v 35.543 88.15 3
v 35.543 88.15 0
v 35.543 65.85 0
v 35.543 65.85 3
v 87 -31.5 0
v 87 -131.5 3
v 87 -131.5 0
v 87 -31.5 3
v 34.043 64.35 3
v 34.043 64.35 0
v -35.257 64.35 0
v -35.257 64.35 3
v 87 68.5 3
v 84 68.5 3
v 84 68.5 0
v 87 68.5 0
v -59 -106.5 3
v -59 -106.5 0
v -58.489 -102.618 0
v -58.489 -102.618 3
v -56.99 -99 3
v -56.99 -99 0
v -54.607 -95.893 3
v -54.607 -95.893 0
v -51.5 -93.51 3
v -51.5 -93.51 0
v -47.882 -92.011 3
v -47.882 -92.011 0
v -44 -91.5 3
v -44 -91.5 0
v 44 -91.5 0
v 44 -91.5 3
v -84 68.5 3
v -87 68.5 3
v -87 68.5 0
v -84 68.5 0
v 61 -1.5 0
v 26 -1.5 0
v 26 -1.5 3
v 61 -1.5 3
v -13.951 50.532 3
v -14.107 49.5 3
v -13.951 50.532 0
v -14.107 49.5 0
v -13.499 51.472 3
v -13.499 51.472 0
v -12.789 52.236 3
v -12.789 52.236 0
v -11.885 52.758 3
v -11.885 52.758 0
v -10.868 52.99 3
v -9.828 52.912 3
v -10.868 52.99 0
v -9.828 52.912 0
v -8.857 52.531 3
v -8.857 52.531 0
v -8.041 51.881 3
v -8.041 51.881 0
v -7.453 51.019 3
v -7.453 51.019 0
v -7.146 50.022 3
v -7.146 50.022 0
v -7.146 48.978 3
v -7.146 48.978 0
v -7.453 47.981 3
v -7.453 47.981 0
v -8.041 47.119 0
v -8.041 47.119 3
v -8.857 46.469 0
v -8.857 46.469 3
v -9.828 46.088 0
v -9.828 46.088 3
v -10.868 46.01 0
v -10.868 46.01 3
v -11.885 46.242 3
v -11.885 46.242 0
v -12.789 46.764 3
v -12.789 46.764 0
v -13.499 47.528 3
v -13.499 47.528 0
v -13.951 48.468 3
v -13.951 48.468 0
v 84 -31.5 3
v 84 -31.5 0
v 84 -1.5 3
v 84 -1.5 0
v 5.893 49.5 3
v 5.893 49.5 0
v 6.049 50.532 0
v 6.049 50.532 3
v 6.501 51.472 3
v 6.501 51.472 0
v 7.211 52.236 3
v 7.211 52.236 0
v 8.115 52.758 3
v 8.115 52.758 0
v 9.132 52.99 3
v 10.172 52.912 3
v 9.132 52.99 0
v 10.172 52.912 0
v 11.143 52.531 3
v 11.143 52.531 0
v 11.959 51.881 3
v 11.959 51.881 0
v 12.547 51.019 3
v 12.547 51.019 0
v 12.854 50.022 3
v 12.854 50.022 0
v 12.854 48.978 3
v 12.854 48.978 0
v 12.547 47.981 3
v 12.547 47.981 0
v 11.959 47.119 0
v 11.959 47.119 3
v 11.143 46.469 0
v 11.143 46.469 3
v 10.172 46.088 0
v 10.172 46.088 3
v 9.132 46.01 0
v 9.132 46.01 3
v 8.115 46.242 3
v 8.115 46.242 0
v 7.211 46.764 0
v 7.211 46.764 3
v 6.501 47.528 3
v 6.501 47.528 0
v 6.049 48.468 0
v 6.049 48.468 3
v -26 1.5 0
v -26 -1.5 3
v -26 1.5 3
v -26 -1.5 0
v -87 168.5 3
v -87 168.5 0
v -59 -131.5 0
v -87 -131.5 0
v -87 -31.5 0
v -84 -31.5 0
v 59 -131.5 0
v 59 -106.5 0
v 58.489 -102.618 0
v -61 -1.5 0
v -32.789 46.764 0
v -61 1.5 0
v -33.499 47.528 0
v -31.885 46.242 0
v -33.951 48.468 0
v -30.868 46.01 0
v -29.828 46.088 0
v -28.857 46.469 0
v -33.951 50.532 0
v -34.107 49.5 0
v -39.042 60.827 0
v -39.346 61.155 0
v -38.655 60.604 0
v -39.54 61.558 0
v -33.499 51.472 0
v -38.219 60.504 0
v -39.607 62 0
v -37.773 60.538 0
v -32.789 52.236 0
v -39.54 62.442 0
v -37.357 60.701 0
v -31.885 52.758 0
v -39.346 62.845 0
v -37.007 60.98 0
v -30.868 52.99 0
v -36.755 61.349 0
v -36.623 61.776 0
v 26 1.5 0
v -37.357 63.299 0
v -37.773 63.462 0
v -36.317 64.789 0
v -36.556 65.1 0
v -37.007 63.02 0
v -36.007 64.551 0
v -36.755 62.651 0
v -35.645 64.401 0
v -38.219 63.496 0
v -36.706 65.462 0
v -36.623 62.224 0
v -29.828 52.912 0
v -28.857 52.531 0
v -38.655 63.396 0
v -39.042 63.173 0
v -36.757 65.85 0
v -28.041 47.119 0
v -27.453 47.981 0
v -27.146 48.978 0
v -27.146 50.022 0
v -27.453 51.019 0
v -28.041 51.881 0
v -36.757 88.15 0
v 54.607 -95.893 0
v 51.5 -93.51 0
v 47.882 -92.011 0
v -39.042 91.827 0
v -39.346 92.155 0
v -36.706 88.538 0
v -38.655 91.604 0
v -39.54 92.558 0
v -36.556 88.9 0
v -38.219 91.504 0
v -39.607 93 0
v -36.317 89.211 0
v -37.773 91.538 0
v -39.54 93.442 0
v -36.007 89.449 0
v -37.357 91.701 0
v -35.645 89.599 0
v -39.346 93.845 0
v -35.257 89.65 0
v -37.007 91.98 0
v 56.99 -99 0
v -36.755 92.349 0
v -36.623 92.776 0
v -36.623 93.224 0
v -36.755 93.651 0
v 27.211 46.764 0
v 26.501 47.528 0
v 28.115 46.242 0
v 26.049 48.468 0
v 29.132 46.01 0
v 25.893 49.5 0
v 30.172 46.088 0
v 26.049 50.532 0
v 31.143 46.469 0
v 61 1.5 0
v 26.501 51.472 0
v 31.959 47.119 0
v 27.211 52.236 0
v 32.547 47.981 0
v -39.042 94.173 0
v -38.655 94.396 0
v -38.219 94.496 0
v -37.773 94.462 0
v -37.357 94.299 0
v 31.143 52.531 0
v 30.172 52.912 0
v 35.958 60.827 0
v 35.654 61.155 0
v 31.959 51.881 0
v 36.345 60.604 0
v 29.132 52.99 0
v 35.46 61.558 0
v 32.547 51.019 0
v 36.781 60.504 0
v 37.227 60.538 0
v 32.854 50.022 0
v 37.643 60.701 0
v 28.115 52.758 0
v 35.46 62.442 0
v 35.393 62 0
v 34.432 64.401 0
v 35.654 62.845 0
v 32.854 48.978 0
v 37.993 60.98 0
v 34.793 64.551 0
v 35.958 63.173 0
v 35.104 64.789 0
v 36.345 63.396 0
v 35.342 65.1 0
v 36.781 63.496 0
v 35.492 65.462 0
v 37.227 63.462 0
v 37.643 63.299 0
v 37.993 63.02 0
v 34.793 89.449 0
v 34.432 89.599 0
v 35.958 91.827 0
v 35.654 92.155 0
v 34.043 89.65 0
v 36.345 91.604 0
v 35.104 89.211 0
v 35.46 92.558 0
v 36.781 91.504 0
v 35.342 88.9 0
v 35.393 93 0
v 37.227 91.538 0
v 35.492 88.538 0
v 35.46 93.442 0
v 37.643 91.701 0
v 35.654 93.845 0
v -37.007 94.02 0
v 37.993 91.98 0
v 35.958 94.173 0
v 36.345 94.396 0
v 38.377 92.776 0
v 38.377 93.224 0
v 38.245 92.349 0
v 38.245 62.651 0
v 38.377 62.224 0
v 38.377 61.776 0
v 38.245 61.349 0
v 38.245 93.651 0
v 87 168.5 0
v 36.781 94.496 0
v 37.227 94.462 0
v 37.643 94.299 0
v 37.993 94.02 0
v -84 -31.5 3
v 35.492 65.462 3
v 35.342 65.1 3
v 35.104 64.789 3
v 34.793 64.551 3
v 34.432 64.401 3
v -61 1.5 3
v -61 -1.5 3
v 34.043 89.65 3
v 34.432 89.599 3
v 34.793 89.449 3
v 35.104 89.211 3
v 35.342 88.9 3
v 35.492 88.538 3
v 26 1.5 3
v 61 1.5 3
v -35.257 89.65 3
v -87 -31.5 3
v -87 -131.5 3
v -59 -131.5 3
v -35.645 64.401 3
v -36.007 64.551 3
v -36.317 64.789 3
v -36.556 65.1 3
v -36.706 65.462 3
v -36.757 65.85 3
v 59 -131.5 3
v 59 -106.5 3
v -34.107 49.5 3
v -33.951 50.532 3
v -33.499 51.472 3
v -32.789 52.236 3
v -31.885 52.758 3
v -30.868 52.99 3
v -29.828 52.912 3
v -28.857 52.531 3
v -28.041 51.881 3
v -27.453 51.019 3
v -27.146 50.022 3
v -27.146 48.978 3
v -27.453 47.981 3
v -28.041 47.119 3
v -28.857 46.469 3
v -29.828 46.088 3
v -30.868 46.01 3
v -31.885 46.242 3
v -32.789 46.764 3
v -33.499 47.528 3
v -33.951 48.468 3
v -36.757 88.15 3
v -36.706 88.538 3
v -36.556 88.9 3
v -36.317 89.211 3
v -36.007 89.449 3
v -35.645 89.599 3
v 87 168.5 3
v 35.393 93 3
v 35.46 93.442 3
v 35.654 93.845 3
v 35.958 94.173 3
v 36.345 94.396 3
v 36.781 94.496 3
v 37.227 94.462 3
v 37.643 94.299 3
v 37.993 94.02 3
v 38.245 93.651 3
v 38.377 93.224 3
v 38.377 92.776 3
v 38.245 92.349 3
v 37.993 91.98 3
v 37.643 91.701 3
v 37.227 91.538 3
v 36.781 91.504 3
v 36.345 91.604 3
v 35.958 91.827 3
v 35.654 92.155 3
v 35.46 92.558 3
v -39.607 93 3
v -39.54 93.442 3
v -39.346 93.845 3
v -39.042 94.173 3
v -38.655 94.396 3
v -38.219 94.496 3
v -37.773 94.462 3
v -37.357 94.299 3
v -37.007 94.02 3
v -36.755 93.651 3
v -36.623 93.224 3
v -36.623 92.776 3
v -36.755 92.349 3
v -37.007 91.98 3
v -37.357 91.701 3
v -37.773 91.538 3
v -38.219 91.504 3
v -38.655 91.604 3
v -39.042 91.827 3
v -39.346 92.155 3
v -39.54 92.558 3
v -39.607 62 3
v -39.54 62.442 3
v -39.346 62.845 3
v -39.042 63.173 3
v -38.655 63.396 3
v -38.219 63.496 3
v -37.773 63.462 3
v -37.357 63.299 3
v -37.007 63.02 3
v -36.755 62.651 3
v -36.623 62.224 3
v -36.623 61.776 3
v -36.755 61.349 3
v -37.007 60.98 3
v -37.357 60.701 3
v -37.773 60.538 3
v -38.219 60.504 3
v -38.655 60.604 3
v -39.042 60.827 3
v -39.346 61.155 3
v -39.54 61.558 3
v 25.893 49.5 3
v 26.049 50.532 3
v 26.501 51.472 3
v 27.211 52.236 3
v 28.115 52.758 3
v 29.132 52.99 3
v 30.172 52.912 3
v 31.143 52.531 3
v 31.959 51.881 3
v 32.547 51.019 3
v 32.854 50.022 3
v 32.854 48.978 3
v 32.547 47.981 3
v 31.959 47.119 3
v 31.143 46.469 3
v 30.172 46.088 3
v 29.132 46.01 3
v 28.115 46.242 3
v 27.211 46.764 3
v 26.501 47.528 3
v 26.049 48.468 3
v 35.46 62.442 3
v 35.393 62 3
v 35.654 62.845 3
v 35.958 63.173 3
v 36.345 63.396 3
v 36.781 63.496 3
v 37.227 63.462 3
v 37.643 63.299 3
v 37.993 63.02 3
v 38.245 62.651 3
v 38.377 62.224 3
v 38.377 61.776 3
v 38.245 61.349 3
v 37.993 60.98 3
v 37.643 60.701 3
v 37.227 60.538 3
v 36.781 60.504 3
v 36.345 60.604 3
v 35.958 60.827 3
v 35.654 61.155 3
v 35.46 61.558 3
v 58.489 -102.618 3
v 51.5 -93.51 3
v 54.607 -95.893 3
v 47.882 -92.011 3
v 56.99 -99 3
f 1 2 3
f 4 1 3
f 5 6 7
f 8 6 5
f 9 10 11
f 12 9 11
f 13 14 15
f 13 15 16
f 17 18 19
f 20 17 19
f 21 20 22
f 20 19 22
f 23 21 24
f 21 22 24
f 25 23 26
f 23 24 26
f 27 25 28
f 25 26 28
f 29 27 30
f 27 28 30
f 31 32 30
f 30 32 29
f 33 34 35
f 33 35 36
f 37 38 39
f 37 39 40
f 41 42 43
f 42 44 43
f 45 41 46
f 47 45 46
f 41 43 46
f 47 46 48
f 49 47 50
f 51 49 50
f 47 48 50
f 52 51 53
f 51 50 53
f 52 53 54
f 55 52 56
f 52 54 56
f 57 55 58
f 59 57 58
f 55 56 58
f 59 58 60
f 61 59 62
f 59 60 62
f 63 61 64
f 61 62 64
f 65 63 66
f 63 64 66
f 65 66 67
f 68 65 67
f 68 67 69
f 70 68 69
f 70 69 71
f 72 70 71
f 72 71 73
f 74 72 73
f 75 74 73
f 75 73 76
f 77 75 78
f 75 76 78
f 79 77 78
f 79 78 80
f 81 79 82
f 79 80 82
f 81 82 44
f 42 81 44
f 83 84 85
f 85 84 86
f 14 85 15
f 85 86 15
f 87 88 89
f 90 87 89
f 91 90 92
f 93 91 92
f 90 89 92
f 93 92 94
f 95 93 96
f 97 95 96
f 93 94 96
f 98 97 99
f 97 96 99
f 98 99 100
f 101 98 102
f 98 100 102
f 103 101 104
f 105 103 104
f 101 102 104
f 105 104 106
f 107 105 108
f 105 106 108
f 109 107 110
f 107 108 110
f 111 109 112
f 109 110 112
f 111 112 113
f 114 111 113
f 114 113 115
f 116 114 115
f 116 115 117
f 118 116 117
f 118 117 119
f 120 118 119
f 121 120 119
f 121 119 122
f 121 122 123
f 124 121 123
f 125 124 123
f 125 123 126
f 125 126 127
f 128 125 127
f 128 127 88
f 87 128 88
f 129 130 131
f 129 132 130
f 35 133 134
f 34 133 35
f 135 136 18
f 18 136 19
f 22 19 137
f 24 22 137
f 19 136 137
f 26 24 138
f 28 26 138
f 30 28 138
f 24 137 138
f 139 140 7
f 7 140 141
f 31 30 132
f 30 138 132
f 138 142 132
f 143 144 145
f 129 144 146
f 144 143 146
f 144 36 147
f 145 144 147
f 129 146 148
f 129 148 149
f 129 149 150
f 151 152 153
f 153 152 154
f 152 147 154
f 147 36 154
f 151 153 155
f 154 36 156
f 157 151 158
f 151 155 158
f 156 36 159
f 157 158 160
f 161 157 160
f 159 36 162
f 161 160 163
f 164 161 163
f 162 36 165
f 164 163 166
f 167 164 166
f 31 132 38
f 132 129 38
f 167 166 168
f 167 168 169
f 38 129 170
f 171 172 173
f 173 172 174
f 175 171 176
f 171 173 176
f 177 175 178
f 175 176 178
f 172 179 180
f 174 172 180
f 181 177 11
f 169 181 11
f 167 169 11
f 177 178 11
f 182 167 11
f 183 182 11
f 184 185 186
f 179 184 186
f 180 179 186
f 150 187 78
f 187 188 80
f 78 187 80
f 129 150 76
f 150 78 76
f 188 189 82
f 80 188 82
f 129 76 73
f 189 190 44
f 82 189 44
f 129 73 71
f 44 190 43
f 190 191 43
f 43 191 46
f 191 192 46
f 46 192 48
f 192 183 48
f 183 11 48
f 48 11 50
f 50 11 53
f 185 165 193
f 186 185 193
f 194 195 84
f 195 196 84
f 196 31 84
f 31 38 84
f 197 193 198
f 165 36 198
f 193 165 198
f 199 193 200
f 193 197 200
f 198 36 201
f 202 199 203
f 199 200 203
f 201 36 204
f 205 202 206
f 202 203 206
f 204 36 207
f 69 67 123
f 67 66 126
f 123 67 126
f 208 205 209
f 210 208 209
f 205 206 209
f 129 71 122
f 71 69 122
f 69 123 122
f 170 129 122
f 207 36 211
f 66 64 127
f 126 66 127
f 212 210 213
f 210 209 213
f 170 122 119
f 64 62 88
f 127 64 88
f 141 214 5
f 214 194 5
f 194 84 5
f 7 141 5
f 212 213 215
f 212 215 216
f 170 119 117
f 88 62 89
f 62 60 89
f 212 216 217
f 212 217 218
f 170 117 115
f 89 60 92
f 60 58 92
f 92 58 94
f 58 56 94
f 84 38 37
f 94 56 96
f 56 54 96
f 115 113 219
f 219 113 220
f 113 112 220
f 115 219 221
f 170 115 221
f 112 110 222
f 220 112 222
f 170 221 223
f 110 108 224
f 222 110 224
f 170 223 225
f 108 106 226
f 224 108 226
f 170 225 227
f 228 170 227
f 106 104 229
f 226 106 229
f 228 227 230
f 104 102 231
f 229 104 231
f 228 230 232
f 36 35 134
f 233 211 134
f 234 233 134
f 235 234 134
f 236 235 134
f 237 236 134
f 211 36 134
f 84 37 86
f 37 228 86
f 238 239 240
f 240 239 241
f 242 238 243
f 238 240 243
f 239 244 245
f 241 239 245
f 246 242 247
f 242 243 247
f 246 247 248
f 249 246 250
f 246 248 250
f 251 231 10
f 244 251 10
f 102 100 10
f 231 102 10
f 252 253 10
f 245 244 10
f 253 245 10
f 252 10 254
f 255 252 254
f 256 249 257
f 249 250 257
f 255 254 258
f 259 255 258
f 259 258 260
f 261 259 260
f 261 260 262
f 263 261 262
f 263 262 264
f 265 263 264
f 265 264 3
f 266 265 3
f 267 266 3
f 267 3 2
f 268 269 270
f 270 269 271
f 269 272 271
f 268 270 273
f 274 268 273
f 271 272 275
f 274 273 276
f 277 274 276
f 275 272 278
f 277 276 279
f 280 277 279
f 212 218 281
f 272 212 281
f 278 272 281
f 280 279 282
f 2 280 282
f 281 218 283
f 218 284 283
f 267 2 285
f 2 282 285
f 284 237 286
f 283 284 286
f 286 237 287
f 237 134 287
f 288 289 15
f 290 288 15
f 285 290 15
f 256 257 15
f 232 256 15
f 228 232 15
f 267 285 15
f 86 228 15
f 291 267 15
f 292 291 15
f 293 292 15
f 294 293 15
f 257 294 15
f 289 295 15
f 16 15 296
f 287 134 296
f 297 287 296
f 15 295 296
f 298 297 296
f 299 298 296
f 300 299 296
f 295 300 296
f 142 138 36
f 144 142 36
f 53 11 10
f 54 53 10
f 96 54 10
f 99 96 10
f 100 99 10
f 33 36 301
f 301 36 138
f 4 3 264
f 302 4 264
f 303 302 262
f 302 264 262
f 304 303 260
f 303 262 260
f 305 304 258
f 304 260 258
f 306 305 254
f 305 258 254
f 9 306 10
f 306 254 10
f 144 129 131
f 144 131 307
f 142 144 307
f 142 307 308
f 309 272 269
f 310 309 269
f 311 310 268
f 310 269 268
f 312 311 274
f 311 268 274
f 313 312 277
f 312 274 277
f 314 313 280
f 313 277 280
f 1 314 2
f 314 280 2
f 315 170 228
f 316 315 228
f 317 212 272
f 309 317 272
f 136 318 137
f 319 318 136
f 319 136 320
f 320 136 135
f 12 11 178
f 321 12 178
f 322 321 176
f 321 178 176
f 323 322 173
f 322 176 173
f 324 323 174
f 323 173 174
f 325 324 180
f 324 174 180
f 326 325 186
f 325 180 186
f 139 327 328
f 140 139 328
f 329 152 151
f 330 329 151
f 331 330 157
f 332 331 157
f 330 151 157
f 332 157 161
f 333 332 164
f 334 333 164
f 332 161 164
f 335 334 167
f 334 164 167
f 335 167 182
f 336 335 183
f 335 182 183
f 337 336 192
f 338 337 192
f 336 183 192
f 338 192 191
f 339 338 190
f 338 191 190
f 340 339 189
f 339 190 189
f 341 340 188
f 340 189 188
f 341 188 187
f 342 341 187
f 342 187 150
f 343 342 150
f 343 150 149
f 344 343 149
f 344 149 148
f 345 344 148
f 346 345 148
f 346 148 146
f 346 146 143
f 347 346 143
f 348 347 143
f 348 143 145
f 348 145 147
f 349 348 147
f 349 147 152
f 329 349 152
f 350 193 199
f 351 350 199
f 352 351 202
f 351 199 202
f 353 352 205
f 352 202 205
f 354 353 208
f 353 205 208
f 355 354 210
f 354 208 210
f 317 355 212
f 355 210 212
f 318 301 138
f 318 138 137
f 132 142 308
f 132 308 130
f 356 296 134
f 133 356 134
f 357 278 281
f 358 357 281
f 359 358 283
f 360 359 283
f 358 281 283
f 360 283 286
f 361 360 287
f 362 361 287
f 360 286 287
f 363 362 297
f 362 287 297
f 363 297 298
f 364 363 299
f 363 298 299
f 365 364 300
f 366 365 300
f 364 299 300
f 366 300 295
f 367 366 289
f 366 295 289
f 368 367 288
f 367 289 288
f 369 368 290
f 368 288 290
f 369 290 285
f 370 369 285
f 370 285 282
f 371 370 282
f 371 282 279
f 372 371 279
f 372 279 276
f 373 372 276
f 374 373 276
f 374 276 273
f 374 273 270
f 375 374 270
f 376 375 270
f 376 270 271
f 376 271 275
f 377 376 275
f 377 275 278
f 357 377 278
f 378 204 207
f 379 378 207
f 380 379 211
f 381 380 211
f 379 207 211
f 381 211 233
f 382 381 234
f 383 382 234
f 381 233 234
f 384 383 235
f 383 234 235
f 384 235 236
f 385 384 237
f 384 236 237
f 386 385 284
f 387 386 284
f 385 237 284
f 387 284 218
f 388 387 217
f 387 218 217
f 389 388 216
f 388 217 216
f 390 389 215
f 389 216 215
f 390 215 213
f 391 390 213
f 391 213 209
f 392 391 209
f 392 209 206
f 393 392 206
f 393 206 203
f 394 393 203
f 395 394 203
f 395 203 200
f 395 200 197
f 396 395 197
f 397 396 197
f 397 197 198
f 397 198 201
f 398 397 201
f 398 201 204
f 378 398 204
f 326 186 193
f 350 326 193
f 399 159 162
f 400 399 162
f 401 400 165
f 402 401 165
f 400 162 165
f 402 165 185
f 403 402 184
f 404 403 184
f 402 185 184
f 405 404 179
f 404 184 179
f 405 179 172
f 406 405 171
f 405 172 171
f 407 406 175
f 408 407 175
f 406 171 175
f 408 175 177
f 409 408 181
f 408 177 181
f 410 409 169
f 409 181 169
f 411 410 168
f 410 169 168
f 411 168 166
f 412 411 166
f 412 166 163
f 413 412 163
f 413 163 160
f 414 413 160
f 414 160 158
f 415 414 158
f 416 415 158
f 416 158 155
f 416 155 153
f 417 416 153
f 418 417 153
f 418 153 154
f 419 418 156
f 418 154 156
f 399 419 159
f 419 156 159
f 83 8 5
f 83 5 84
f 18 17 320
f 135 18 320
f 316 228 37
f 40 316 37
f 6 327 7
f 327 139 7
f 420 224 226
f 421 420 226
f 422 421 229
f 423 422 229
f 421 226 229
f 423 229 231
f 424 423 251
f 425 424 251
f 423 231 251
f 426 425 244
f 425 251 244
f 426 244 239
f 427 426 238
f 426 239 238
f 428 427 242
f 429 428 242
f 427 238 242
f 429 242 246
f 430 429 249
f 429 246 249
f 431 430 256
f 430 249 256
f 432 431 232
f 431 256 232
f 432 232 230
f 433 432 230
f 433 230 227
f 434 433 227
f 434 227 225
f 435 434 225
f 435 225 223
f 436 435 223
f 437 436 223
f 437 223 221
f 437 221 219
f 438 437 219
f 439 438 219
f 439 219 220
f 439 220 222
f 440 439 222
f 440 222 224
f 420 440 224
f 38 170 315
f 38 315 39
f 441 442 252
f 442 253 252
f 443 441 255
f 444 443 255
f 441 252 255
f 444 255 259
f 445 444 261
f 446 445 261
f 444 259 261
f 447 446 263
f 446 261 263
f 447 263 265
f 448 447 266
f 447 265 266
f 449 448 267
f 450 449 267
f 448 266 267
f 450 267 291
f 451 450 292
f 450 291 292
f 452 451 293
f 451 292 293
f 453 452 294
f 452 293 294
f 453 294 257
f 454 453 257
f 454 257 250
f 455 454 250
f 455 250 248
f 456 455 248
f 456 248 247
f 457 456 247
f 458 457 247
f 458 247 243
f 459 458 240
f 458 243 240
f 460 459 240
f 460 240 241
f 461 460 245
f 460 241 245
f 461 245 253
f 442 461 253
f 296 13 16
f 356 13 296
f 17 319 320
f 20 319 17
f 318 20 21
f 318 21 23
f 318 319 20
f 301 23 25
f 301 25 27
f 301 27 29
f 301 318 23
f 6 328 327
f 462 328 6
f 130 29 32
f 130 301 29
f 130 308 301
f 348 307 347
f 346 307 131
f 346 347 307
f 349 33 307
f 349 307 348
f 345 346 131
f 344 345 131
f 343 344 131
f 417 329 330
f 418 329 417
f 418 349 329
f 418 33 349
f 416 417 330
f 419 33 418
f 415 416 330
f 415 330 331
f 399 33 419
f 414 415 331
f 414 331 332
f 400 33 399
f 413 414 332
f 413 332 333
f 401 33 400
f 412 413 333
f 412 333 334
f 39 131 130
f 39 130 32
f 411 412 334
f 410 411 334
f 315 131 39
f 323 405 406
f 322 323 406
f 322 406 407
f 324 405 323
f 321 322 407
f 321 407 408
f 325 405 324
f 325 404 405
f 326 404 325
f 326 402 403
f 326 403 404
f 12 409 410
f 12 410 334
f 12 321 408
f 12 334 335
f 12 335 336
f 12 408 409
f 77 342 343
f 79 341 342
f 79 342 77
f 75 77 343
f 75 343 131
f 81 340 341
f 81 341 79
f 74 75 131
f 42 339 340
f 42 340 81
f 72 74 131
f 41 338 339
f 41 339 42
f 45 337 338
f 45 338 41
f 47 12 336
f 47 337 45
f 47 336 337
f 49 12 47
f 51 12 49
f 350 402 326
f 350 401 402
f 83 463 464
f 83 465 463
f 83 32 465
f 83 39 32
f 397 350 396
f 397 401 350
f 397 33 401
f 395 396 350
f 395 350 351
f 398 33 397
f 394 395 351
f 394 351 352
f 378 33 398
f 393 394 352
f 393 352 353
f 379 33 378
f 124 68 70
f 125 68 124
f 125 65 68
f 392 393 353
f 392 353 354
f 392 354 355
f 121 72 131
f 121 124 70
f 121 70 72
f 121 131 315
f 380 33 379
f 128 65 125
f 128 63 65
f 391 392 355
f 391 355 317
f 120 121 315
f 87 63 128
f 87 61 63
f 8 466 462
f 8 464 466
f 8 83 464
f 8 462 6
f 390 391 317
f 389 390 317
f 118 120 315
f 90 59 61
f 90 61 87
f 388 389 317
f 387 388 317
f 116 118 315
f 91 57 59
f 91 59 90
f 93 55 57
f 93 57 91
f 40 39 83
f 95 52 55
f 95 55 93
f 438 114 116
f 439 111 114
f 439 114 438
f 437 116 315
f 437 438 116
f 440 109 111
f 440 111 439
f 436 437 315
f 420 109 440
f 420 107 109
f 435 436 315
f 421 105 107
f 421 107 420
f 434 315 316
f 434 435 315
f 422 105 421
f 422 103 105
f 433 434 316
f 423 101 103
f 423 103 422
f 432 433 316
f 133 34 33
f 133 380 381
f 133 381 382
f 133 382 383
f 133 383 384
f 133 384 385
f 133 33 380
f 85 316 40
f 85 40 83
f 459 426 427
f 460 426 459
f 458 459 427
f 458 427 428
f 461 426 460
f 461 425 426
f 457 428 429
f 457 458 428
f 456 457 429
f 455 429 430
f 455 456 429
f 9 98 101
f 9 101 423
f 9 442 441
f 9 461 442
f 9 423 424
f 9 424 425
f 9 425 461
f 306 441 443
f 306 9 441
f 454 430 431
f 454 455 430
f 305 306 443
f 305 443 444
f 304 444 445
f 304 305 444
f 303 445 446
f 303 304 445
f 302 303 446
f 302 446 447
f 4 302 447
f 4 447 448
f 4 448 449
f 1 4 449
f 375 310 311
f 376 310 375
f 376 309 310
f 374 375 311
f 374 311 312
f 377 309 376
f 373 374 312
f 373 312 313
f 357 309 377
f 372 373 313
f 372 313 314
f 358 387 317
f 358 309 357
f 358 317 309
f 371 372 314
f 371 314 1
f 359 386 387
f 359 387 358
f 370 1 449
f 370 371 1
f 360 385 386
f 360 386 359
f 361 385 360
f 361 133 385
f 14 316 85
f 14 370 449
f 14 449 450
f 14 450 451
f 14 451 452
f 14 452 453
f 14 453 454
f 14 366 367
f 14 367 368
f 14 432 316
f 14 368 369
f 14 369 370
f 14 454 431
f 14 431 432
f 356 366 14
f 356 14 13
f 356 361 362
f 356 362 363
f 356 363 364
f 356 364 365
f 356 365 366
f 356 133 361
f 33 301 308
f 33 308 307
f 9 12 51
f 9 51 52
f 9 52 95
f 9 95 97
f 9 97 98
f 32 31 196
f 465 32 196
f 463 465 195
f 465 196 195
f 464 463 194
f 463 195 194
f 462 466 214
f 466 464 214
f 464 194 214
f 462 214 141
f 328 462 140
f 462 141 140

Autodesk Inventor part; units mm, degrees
ref_plane "YZ Plane" through (0, 0, 0) normal (1, 0, 0) x (0, 1, 0)
ref_plane "XZ Plane" through (0, 0, 0) normal (0, 1, 0) x (-1, 0, 0)
ref_plane "XY Plane" through (0, 0, 0) normal (0, 0, 1) x (1, 0, 0)
sketch "Sketch1" plane through (0, 0, 0) normal (0, 0, 1) x (1, 0, 0)
  line L0 (-84, -131.5) -> (84, -131.5)
  line L1 (84, -131.5) -> (84, 168.5)
  line L2 (84, 168.5) -> (-84, 168.5)
  line L3 (-84, 168.5) -> (-84, -131.5)
  line L4 (-84, 1.5) -> (-84, -1.5) projected
  line L5 (84, -1.5) -> (84, 1.5) projected
  line L6 (61, -1.5) -> (84, -1.5) projected
  line L7 (26, -1.5) -> (61, -1.5) projected
  line L8 (61, 1.5) -> (61, -1.5) projected
  line L9 (26, 1.5) -> (61, 1.5) projected
  line L10 (26, 1.5) -> (26, -1.5) projected
  point P0 (0, 0)
  dimension "d0" = 300
  dimension "d1" = 170
extrude "Extrusion1" add sketch "Sketch1" along normal blind 3
sketch "Sketch2" plane through (0, 0, 0) normal (0, 0, -1) x (-1, 0, 0)
  line L0 (84, 1.5) -> (84, -1.5)
  line L1 (84, -1.5) -> (61, -1.5)
  line L2 (61, 1.5) -> (61, -1.5)
  line L3 (26, 1.5) -> (61, 1.5)
  line L4 (26, -1.5) -> (26, 1.5)
  line L5 (26, -1.5) -> (-26, -1.5)
  line L6 (-26, 1.5) -> (-26, -1.5)
  line L7 (-61, 1.5) -> (-26, 1.5)
  line L8 (-61, -1.5) -> (-61, 1.5)
  line L9 (-61, -1.5) -> (-84, -1.5)
  line L10 (-84, -1.5) -> (-84, 1.5)
  line L11 (-84, 1.5) -> (-61, 1.5)
  line L12 (61, 1.5) -> (84, 1.5)
  line L13 (61, -1.5) -> (26, -1.5)
  line L14 (-26, 1.5) -> (26, 1.5)
  line L15 (-26, -1.5) -> (-61, -1.5)
  point P0 (0, 0)
extrude "Extrusion2" cut sketch "Sketch2" against normal blind 10 contours L2 L13 L4 L3
sketch "Sketch3" plane through (0, 0, 3) normal (0, 0, 1) x (1, 0, 0)
  line L0 (84, -131.5) -> (84, 168.5) projected
  line L1 (84, -131.5) -> (87, -131.5)
  line L2 (87, -131.5) -> (87, -31.5)
  line L3 (87, -31.5) -> (84, -31.5)
  line L4 (84, -31.5) -> (84, -131.5)
  line L5 (-61, -1.5) -> (-26, -1.5) projected
  line L6 (-26, -1.5) -> (-26, 1.5) projected
  line L7 (-26, 1.5) -> (-61, 1.5) projected
  line L8 (-61, 1.5) -> (-61, -1.5) projected
  line L9 (26, 1.5) -> (26, -1.5) projected
  line L10 (26, -1.5) -> (61, -1.5) projected
  line L11 (61, -1.5) -> (61, 1.5) projected
  line L12 (61, 1.5) -> (26, 1.5) projected
  line L13 (-84, 168.5) -> (84, 168.5) projected
  line L14 (84, 168.5) -> (84, -131.5) projected
  line L15 (84, -131.5) -> (-84, -131.5) projected
  line L16 (-84, -131.5) -> (-84, 168.5) projected
  line L17 (87, 168.5) -> (84, 168.5)
  line L18 (84, 68.5) -> (87, 68.5)
  line L19 (87, 68.5) -> (87, 168.5)
  line L20 (84, 168.5) -> (84, 68.5)
  line L21 (-84, -31.5) -> (-87, -31.5)
  line L22 (-87, -131.5) -> (-84, -131.5)
  line L23 (-84, -131.5) -> (-84, -31.5)
  line L24 (-87, -31.5) -> (-87, -131.5)
  line L25 (-84, 168.5) -> (-87, 168.5)
  line L26 (-87, 68.5) -> (-84, 68.5)
  line L27 (-84, 68.5) -> (-84, 168.5)
  line L28 (-87, 168.5) -> (-87, 68.5)
  point P0 (0, 0)
  dimension "d6" = 100
  dimension "d7" = 3
  dimension "d10" = 200
  dimension "d13" = 171
extrude "Extrusion3" add sketch "Sketch3" against normal up to surface (3 mm away) contours L0 L3 L2 L1 | L22 L24 L21 L16 | L0 L17 L19 L18 | L26 L28 L25 L16
sketch "Sketch4" plane through (0, 0, 3) normal (0, 0, 1) x (1, 0, 0)
  line L0 (-59, -131.5) -> (59, -131.5)
  line L1 (59, -131.5) -> (59, -91.5)
  line L2 (59, -91.5) -> (-59, -91.5)
  line L3 (-59, -91.5) -> (-59, -131.5)
  line L4 (-87, -131.5) -> (87, -131.5) projected
  line L5 (87, -131.5) -> (87, -31.5) projected
  line L6 (-87, -31.5) -> (-87, -131.5) projected
  point P0 (0, 0)
  dimension "d18" = 28
  dimension "d19" = 28
  dimension "d20" = 40
extrude "Extrusion4" cut sketch "Sketch4" against normal blind 10
fillet "Fillet1" radius 15 2 edges at (59, -91.5, 1.5) (-59, -91.5, 1.5)
sketch "Sketch5" plane through (0, 0, 0) normal (0, 0, -1) x (-1, 0, 0)
  circle A0 centre (-29.3933, 49.5) radius 3.5
  circle A1 centre (-9.3933, 49.5) radius 3.5
  circle A2 centre (10.6067, 49.5) radius 3.5
  circle A3 centre (30.6067, 49.5) radius 3.5
  line L0 (-34.0433, 89.15) -> (35.2567, 89.15)
  arc A4 (36.2567, 88.15) -> (35.2567, 89.15) centre (35.2567, 88.15) ccw
  line L1 (36.2567, 88.15) -> (36.2567, 65.85)
  arc A5 (35.2567, 64.85) -> (36.2567, 65.85) centre (35.2567, 65.85) ccw
  line L2 (35.2567, 64.85) -> (-34.0433, 64.85)
  arc A6 (-35.0433, 65.85) -> (-34.0433, 64.85) centre (-34.0433, 65.85) ccw
  line L3 (-35.0433, 65.85) -> (-35.0433, 88.15)
  arc A7 (-34.0433, 89.15) -> (-35.0433, 88.15) centre (-34.0433, 88.15) ccw
  line L4 (-34.5433, 88.15) -> (-34.5433, 65.85)
  arc A8 (-34.5433, 65.85) -> (-34.0433, 65.35) centre (-34.0433, 65.85) ccw
  line L5 (-34.0433, 65.35) -> (35.2567, 65.35)
  arc A9 (35.2567, 65.35) -> (35.7567, 65.85) centre (35.2567, 65.85) ccw
  line L6 (35.7567, 65.85) -> (35.7567, 88.15)
  arc A10 (35.7567, 88.15) -> (35.2567, 88.65) centre (35.2567, 88.15) ccw
  line L7 (35.2567, 88.65) -> (33.3925, 88.65)
  spline S0 degree 3 poles (33.3925, 88.65) (33.3126, 88.65) (33.217, 88.642) (32.9717, 88.6132) (32.7737, 88.5819) (32.6067, 88.5819) knots 0.255439 0.255439 0.255439 0.255439 0.279421 0.279421 0.329528 0.329528 0.329528 0.329528
  line L8 (32.6067, 88.5819) -> (-31.3933, 88.5819)
  spline S1 degree 3 poles (-31.3933, 88.5819) (-31.5603, 88.5819) (-31.7583, 88.6132) (-32.0036, 88.642) (-32.0992, 88.65) (-32.1791, 88.65) knots 0.329528 0.329528 0.329528 0.329528 0.379635 0.379635 0.403617 0.403617 0.403617 0.403617
  line L9 (-32.1791, 88.65) -> (-34.0433, 88.65)
  arc A11 (-34.0433, 88.65) -> (-34.5433, 88.15) centre (-34.0433, 88.15) ccw
  line L10 (-33.3933, 69) -> (-33.3933, 86)
  line L11 (-33.3933, 86) -> (34.6067, 86)
  line L12 (34.6067, 86) -> (34.6067, 69)
  line L13 (34.6067, 69) -> (-33.3933, 69)
  circle A12 centre (38.1067, 93) radius 1.5 projected
  circle A13 centre (-36.8933, 93) radius 1.5 projected
  circle A14 centre (-36.8933, 62) radius 1.5 projected
  circle A15 centre (38.1067, 62) radius 1.5 projected
  line L14 (36.7567, 65.85) -> (36.7567, 88.15)
  arc A16 (36.7567, 88.15) -> (35.2567, 89.65) centre (35.2567, 88.15) ccw
  line L15 (35.2567, 89.65) -> (-34.0433, 89.65)
  arc A17 (-34.0433, 89.65) -> (-35.5433, 88.15) centre (-34.0433, 88.15) ccw
  line L16 (-35.5433, 88.15) -> (-35.5433, 65.85)
  arc A18 (-35.5433, 65.85) -> (-34.0433, 64.35) centre (-34.0433, 65.85) ccw
  line L17 (-34.0433, 64.35) -> (35.2567, 64.35)
  arc A19 (35.2567, 64.35) -> (36.7567, 65.85) centre (35.2567, 65.85) ccw
  point P0 (0, 0)
  dimension "d24" = 0.5
extrude "Extrusion5" cut sketch "Sketch5" against normal blind 10 contours A0 | A1 | A2 | A3 | L0 A4 L1 A5 L2 A6 L3 A7 | A11 L9 S1 L8 S0 L7 A10 L6 A9 L5 A8 L4 | L10 L11 L12 L13 | A12 | A13 | A14 | A15 | A19 L17 A18 L16 A17 L15 A16 L14
properties part number "Pared_Lateral_ConCircuito"
